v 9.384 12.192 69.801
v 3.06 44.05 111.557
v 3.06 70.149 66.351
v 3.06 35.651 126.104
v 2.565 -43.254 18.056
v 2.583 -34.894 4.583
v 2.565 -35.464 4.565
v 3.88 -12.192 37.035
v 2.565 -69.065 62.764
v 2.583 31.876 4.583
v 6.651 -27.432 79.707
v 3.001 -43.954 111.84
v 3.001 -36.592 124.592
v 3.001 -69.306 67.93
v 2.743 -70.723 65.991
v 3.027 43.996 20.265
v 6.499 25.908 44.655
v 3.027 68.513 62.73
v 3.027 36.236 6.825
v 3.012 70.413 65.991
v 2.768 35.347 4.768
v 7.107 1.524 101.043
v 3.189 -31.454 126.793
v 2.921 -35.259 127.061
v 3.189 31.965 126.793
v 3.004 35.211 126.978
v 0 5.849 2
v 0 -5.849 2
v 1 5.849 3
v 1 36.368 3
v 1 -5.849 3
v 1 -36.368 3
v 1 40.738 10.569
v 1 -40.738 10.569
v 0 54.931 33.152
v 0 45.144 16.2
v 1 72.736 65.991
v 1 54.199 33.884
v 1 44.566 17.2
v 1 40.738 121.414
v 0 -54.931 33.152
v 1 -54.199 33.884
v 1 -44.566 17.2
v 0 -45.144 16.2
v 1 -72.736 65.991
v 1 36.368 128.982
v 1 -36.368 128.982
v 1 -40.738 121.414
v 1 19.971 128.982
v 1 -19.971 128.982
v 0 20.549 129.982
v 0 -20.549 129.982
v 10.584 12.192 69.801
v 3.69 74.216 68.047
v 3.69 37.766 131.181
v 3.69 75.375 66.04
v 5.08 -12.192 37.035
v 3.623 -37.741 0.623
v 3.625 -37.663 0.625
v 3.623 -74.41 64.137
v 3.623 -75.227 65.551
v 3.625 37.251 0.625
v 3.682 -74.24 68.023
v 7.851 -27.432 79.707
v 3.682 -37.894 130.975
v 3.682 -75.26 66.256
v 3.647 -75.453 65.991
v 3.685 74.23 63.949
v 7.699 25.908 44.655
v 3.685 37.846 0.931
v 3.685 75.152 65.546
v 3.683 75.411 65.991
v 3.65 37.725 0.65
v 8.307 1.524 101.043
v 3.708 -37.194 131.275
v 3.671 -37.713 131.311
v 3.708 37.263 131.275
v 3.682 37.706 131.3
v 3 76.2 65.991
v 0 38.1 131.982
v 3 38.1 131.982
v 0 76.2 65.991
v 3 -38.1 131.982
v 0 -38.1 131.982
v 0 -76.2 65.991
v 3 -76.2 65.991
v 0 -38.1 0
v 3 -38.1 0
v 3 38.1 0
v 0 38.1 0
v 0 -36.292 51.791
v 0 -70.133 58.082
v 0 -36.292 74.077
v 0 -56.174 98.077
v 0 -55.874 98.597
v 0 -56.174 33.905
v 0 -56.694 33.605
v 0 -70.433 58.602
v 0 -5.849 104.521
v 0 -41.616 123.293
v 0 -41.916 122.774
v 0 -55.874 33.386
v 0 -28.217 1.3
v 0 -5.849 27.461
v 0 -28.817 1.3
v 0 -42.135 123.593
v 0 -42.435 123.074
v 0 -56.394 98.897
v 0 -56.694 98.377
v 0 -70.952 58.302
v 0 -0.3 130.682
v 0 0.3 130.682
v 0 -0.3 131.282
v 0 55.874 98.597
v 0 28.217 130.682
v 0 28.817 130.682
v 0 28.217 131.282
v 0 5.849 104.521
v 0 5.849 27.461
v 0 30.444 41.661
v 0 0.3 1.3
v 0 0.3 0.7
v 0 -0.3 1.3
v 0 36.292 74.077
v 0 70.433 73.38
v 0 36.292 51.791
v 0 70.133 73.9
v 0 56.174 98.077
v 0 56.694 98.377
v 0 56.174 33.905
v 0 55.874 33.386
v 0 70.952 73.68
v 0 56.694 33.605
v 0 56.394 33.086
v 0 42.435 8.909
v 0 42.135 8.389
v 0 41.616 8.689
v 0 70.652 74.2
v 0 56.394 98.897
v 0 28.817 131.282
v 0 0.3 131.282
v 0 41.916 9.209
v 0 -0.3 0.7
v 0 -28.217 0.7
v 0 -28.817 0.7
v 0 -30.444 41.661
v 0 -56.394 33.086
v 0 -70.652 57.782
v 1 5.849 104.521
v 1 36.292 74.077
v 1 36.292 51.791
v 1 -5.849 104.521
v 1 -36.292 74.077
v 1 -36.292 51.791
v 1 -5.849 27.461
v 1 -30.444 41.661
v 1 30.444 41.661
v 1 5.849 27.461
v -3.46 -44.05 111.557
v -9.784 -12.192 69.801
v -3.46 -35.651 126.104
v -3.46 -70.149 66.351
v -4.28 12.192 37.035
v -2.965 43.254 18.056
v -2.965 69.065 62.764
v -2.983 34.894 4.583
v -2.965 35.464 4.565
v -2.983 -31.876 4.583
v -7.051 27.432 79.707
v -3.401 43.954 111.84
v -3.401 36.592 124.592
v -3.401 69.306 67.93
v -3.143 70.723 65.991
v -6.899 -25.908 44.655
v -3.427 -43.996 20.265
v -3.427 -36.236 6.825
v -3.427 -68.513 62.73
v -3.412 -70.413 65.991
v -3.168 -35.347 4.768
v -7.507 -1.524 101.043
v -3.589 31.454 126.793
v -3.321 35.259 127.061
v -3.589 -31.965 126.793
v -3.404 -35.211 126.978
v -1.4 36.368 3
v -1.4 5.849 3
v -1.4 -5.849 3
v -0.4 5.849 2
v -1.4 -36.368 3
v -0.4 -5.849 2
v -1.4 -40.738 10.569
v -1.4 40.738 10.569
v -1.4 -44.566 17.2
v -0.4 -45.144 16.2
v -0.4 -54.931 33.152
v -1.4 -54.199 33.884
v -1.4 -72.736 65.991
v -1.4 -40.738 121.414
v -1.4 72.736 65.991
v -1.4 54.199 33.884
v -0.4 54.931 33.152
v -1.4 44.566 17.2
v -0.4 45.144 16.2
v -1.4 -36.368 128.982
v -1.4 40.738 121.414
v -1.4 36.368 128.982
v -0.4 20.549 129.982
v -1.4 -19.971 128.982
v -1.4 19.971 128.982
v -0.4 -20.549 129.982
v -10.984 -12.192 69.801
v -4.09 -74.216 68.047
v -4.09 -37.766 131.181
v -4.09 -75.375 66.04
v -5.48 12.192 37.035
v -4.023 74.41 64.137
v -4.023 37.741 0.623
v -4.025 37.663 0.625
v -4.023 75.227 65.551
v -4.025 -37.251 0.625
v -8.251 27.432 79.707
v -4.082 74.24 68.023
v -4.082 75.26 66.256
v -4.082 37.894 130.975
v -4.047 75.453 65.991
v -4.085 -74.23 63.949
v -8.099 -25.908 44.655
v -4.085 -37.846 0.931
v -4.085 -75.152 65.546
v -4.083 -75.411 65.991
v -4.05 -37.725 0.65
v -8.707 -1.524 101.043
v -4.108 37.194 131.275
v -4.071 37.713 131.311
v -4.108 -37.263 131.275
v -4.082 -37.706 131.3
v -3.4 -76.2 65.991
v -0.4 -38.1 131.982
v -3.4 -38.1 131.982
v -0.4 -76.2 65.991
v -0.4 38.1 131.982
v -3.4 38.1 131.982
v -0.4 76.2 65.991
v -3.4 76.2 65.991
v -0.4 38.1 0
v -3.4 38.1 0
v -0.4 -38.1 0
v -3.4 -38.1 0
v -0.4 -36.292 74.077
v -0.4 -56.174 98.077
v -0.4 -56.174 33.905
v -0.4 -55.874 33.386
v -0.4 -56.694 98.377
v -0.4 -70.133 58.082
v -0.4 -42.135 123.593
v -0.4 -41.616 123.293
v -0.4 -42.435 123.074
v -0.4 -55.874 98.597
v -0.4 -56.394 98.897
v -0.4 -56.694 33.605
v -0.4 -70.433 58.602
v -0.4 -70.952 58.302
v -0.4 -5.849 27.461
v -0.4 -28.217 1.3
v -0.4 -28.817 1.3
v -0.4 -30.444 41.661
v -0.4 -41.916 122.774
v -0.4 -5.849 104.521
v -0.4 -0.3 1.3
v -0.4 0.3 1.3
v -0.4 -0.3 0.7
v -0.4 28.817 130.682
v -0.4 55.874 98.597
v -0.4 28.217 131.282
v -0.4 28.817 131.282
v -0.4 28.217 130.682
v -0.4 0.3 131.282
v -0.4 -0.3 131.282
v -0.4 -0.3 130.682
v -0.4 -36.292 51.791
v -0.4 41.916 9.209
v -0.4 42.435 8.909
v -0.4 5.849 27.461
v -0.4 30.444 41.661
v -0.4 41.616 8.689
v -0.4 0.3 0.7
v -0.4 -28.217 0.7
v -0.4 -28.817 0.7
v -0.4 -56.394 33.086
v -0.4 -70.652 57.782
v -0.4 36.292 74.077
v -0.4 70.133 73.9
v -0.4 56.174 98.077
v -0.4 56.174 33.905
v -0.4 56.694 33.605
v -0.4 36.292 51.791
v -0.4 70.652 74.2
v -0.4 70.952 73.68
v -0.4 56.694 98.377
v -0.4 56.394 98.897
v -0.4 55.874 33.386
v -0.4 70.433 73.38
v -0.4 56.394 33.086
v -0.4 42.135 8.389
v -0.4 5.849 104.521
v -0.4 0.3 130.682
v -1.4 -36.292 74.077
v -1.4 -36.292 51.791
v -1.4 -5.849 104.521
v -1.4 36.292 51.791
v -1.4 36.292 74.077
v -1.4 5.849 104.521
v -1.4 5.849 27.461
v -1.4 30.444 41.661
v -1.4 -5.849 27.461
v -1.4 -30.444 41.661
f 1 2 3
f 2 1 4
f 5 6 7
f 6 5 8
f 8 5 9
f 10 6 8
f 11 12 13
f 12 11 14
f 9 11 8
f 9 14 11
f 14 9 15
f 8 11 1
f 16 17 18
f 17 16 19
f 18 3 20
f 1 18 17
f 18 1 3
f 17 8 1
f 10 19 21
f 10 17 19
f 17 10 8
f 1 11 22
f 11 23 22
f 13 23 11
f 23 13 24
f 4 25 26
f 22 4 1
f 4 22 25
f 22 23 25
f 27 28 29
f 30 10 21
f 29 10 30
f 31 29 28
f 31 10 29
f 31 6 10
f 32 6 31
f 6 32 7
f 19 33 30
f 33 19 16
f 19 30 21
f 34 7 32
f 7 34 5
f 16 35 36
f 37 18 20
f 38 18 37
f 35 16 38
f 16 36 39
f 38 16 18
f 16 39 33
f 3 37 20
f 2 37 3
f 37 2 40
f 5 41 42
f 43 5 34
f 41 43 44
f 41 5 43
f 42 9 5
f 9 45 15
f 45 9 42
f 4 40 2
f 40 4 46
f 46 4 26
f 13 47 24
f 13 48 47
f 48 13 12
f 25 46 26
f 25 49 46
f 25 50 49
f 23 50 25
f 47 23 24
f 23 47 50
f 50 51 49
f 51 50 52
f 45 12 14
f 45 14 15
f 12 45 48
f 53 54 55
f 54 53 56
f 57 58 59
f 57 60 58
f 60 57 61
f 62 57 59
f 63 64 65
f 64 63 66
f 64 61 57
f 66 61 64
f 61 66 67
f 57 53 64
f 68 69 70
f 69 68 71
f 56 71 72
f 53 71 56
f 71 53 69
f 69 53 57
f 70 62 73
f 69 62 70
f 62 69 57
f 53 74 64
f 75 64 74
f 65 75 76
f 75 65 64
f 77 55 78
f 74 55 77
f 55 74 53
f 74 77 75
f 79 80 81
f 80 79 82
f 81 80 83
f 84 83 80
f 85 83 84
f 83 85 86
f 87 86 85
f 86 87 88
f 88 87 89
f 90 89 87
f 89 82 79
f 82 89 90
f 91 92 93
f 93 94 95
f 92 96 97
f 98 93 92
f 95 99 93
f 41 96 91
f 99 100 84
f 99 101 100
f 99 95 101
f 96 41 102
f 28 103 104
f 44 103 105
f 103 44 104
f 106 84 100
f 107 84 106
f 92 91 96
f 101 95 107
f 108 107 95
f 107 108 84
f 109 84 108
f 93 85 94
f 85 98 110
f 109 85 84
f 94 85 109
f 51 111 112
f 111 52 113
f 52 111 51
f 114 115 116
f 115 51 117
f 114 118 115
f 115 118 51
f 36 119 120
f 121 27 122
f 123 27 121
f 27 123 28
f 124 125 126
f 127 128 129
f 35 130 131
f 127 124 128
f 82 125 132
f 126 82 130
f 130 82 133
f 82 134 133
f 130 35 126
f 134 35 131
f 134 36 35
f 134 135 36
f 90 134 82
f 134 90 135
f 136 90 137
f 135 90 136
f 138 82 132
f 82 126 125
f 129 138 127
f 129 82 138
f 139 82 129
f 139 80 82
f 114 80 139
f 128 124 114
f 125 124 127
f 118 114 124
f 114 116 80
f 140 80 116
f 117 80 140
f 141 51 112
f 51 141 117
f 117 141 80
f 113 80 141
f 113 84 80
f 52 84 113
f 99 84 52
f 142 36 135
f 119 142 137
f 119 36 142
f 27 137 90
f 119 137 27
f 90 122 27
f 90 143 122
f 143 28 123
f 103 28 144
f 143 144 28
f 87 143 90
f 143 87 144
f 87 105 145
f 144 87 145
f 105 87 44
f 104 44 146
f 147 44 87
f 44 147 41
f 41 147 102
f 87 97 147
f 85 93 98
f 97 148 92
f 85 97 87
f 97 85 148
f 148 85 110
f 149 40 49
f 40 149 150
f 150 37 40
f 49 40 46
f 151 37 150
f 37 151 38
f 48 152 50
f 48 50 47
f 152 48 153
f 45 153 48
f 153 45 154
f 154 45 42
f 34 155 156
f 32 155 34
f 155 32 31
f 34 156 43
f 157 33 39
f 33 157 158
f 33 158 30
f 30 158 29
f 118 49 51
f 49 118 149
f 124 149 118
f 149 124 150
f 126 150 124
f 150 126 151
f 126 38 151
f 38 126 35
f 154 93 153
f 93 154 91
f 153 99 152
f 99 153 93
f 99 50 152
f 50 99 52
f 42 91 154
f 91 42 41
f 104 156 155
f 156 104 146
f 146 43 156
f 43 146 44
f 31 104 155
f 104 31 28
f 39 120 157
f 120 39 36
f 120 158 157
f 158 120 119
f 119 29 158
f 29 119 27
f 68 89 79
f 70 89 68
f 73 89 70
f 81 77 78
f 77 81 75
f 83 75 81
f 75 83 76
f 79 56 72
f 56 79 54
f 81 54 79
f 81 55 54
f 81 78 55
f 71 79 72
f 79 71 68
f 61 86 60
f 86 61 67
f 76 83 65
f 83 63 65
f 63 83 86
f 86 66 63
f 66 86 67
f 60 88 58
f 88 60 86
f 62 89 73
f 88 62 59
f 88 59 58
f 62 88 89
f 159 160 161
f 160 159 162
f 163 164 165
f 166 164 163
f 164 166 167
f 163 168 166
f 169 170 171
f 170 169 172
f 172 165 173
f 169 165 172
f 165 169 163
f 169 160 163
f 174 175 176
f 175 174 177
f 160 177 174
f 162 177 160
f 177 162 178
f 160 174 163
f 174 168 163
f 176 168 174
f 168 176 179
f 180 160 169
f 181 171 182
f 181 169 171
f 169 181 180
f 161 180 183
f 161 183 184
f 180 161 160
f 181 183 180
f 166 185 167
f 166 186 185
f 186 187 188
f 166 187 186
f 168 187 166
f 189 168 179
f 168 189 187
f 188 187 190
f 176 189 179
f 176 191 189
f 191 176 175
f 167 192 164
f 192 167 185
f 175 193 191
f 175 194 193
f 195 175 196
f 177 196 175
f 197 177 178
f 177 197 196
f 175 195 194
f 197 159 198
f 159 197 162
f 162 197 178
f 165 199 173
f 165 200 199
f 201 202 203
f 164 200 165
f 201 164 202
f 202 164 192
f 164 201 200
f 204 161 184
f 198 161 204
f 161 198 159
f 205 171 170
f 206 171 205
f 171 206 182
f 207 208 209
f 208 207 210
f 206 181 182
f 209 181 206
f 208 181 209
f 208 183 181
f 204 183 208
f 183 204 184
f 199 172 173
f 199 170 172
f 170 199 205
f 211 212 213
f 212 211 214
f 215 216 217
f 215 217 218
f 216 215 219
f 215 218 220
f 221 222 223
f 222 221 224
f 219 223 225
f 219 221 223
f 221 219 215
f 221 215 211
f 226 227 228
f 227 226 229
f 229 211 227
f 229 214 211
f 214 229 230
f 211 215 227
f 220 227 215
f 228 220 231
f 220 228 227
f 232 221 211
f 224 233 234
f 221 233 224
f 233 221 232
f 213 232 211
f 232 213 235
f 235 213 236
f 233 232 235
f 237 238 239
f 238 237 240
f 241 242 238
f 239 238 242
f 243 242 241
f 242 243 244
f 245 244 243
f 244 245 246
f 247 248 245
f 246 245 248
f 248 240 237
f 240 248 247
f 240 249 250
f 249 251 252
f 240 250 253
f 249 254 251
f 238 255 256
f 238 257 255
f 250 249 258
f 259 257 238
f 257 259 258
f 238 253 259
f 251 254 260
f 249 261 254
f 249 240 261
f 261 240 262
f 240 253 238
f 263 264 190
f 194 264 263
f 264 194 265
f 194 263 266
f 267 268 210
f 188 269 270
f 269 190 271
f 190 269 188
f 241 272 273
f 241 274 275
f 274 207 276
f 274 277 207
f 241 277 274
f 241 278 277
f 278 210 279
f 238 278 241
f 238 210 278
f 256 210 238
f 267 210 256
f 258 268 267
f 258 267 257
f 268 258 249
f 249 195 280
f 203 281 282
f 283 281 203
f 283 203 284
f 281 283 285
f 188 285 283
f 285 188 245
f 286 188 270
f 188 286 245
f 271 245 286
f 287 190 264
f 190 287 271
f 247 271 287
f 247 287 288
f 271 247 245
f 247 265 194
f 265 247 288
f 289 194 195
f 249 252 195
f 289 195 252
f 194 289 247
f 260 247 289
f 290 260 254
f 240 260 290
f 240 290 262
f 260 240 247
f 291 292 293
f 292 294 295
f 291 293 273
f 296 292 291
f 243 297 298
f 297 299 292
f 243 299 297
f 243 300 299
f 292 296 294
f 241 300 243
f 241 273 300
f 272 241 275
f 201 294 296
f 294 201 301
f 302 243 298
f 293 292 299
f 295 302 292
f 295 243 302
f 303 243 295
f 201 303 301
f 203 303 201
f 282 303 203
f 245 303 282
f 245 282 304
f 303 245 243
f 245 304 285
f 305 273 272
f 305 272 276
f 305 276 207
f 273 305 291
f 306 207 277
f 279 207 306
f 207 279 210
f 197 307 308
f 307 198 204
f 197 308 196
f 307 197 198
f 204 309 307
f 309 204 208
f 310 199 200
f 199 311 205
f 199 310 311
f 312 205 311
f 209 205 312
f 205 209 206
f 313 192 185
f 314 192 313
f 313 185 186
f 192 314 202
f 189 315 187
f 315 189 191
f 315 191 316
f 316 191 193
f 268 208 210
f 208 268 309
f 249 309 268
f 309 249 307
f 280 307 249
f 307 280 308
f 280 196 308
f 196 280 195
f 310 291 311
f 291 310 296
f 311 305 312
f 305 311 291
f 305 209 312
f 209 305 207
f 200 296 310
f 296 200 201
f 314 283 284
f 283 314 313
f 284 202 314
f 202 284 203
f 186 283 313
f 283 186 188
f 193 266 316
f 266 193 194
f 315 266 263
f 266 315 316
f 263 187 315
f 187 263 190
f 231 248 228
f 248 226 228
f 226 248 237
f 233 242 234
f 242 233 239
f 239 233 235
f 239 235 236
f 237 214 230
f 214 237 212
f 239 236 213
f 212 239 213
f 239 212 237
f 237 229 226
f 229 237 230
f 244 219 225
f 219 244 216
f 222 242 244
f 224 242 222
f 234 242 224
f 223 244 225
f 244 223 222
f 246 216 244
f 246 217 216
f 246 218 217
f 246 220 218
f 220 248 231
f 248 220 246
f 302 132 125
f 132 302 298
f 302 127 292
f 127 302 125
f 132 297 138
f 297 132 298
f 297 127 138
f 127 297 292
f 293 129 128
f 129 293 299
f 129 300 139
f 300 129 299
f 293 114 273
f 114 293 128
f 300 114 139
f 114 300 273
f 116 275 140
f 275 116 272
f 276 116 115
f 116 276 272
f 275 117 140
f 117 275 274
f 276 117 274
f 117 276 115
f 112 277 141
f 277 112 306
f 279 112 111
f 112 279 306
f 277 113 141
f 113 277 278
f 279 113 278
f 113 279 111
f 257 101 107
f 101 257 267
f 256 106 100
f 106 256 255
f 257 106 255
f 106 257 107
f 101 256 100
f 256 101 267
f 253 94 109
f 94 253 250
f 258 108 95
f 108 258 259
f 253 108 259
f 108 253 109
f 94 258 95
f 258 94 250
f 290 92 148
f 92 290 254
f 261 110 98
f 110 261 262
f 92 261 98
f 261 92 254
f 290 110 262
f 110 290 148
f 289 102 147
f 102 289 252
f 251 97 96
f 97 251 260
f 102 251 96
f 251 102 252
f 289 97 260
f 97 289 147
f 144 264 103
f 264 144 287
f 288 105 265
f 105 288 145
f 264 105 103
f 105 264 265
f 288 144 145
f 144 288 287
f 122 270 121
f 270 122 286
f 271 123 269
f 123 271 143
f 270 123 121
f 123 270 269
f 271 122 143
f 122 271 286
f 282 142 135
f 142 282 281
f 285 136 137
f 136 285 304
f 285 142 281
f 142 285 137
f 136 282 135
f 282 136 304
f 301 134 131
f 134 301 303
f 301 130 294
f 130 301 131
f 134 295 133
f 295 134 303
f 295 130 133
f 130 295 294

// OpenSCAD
// Hexagon wall tile v39 — parametric rebuild of v30
// Front: identical low-poly facets to v30 (same facet angles at every size).
// Edge profile: identical on every size (edge depth, rim width) so tiles butt flush.
// Back: six corner pads for 1" (25 mm) double-sided mounting tape.
// v32: tape pads are flat plates hung from the rim with an air gap to the front skin.
// v33: thinner skin + thinner pads so the air gap is 1.4 mm even right at the edges
//      (v32 had only 0.8 mm there and showed marks along the slanted edges).
// v34: snap-off stabilizer fins behind the bottom edge so the tall, thin tile can't tip over
//      while printing. Break them off afterwards (bend sideways) and the back stays flat.
// v35: 0.6 mm 45° chamfer on the front edge (crisp, consistent shadow line between tiles; hides
//      first-layer squish and brim trim marks) + relief_scale to deepen the facets if wanted.
// v37: much smaller breakaway tabs (0.8 x 0.6 mm, every 8 mm) so the fins snap off easily.
// v38: full-height snap-off BRACE FRAME behind the tile: a thin hex ring + X/vertical bars,
//      1 mm behind the back, tied to the tile rim by tiny tabs all the way round (incl. the top).
//      Tile + brace act as a stiff box while printing; the fins now sit on the brace.
//      Peel the brace off after printing — the tabs only touch the back rim.
// v39: PAIR mode (default): two identical tiles printed back-to-back, 0.4 mm apart, so each
//      cradles the other full-height. Only 12 tiny tabs (corners + mid-sides) join the back
//      rims — twist/peel the tiles apart. No brace, no fins, almost no waste. The pair is
//      turned 90° on the bed so the 'back' seam lands on a side edge, not on either face.
// Prints upright on a flat edge with NO supports (every downward edge is 45° or steeper).
//
// Export one size at a time, e.g.:
//   openscad -D size_in=6 -o hex_pair_v39_6in.stl hex_wall_tile_v39.scad

/* [Size] */
size_in       = 6;      // point-to-point width in inches (3, 6, 10 ...)

/* [Edge profile — keep identical across sizes] */
// Space behind the skin at the edge = edge_depth - skin; it must be >= pad_plate + pad_gap + pad_recess.
edge_depth    = 3.6;    // depth of the outer edge, back plane to front face (mm)
rim           = 2.0;    // perimeter wall thickness at the back plane (mm)
front_chamfer = 0.6;    // 45° chamfer on the front edge (mm); 0 = sharp edge

/* [Look] */
relief_scale  = 1.0;    // 1.0 = v30 facets; 1.5 = 50% deeper facets (same edge profile on all sizes)

/* [Front skin] */
skin          = 1.2;    // front skin thickness (mm) — 3 lines at 0.4 mm, same on all sizes

/* [Tape pads] */
tape_width    = 25.4;   // tape width (mm)
pad_margin    = 3;      // extra pad width beyond the tape (mm)
pad_max_frac  = 0.45;   // pad never larger than this fraction of the tile radius (keeps 3" usable)
pad_plate     = 1.0;    // thickness of the pad plates (mm)
pad_gap       = 1.4;    // minimum air gap between pads and the front skin (mm) — keeps the front clean
pad_recess    = 0;      // pads set back from the rim (mm); >0 lets the rim touch the wall,
                        // but near the edges the plate is then trimmed thinner to keep pad_gap

/* [Print stabilizers (snap off after printing)] */
stabilizers   = false;  // v34-v38 option; not needed in pair mode
fin_count     = 2;      // fins behind the bottom edge, placed symmetrically
fin_thick     = 1.6;    // fin thickness (mm)
fin_height_frac = 0.35; // fin height as a fraction of the tile height
fin_depth_frac  = 0.4;  // fin depth behind the brace as a fraction of fin height
fin_depth_min   = 15;   // (mm)
fin_gap       = 0.5;    // air gap between fin and tile back (mm)
tab_height    = 0.6;    // breakaway tab height (mm, vertical when printing) — 3 layers at 0.2
tab_width     = 0.8;    // breakaway tab width (mm), centred on the fin — 2 lines
tab_pitch     = 8;      // spacing between tabs (mm)

/* [Full-height brace frame (snap off after printing)] */
brace         = false;  // v38 option; not needed in pair mode
brace_gap     = 1.0;    // air gap between tile back and brace (mm)
brace_thick   = 1.6;    // brace thickness (mm)
brace_rim_w   = 4;      // width of the brace's hex ring (mm)
brace_bar_w   = 3;      // width of the X and vertical bars (mm)
brace_tab_pitch = 10;   // spacing of brace tabs along each rim side (mm)
brace_tab     = 0.8;    // brace tab size (mm) — tiny, so the brace peels off

/* [Back-to-back pair (default)] */
pair          = true;
pair_gap      = 0.4;    // gap between the two back planes (mm): close enough to cradle, not fused
pair_tab      = 0.6;    // tab size (mm) — 12 tabs total, tiny so the pair twists apart

/* [Output] */
orient_for_print = true; // stand upright on a flat edge, back facing +Y

/* [Hidden] */
R   = size_in * 25.4 / 2;         // corner radius
AP  = R * cos(30);                // apothem
PAD = min(tape_width + pad_margin, R * pad_max_frac);

// Normalised front geometry from v30 (x, y in units of R; z = relief above edge, units of R)
FP = [[1,0,0],[0.5,0.866025,0],[-0.5,0.866025,0],[-1,0,0],[-0.5,-0.866025,0],[0.5,-0.866025,0],
      [0.16,0.05,0.091654],[-0.16,-0.38,0.019428],[-0.36,0.18,0.05579],[0.34,-0.28,0.053795],[0.02,0.46,0.061766]];
FACES = [[0,6,1],[4,3,7],[5,4,7],[8,3,2],[7,3,8],[7,8,6],[5,9,0],[9,6,0],[9,7,6],[5,7,9],
         [6,8,10],[8,2,10],[6,10,1],[10,2,1],
         [1,12,11,0],[2,13,12,1],[3,14,13,2],[4,15,14,3],[5,16,15,4],[0,11,16,5],
         [11,12,13,14,15,16]];
RELIEF_MAX = 0.091654 * R * relief_scale;
D = edge_depth + RELIEF_MAX + 1;  // max depth used for chamfers

// Solid bounded by the faceted front (shifted by dz) and a flat back at z = zb
module body(dz = 0, zb = 0) {
    pts = concat(
        [for (p = FP) [p[0]*R, p[1]*R, edge_depth + p[2]*R*relief_scale + dz]],
        [for (i = [0:5]) [FP[i][0]*R, FP[i][1]*R, zb]]);
    polyhedron(points = pts, faces = FACES, convexity = 4);
}

module hex2d(apothem) { circle(r = apothem / cos(30), $fn = 6); }

// Back cavity: behind the skin, inside the rim; rim inner faces slope 45° so nothing needs support
module cavity(extra = 0) {
    H  = D + 2;
    a0 = AP - rim - extra + 1;             // apothem at z = -1
    intersection() {
        body(dz = -skin - extra, zb = -1);
        translate([0, 0, -1]) linear_extrude(height = H, scale = (a0 - H) / a0) hex2d(a0);
    }
}

// Corner pad footprint (2D), k = corner index 0..5:
// the corner region of the inner hex, PAD wide, long enough to hold a PAD x PAD square of tape
module pad_core(k) {
    U0  = (AP - rim) / cos(30);                    // inner corner distance from centre
    LEN = PAD / (2 * tan(60)) + PAD + 1;           // apex taper + full square + margin
    intersection() {
        hex2d(AP - rim + 0.3);                     // overlap 0.3 mm into the rim to fuse
        rotate(60 * k) translate([U0 - LEN, -PAD / 2]) square([LEN + 5, PAD]);
    }
}

// In-plane self-support: printed upright, a vertical plate needs every downward edge at >= 45°.
// Sweep each pad toward the nearest rim side below it at 45° (or straight down for bottom corners).
SWEEP = [[1, -1], [1, -1], [-1, -1], [-1, -1], [0, -1], [0, -1]];
module pad_fp(k) {
    intersection() {
        hex2d(AP - rim + 0.3);
        hull() { pad_core(k); translate(SWEEP[k] * R) pad_core(k); }
    }
}

module pads() {
    intersection() {
        body(dz = -skin - pad_gap, zb = -1);       // never closer than pad_gap to the skin
        translate([0, 0, pad_recess]) linear_extrude(pad_plate) for (k = [0:5]) pad_fp(k);
    }
}

module chamfer_clip() {
    HB = D + 5;
    union() {
        translate([0, 0, -2]) linear_extrude(edge_depth - front_chamfer + 2) hex2d(AP + 1);
        translate([0, 0, edge_depth - front_chamfer]) linear_extrude(height = HB, scale = (AP - HB) / AP) hex2d(AP);
    }
}

module tile() {
    intersection() {
        union() {
            difference() { body(); cavity(); }
            pads();
        }
        if (front_chamfer > 0) chamfer_clip(); else translate([-2*R, -2*R, -5]) cube([4*R, 4*R, 4*R]);
    }
}

// Triangular fins standing on the bed behind the back (model z < 0), joined to the tile by small tabs
FIN_H = fin_height_frac * 2 * AP;
FIN_L = max(fin_depth_min, fin_depth_frac * FIN_H);
function fin_x(i) = (fin_count == 1) ? 0 : (-1 + 2 * i / (fin_count - 1)) * 0.35 * R;
BZ = brace ? brace_gap + brace_thick : 0;          // fins start behind the brace when it is used
module stabilizer_fins() {
    for (i = [0 : fin_count - 1]) {
        x = fin_x(i);
        fg = brace ? BZ - 0.3 : fin_gap;                // with a brace: fused into it (no tabs needed)
        hull() {                                            // fin: vertical triangle
            translate([x - fin_thick/2, -AP, -fg - FIN_L]) cube([fin_thick, 0.01, FIN_L]);
            translate([x - fin_thick/2, -AP, -fg - 0.01]) cube([fin_thick, FIN_H, 0.01]);
        }
        if (!brace)
            for (y = [0 : tab_pitch : FIN_H - tab_height])  // breakaway tabs into the back plane
                translate([x - tab_width/2, -AP + y, -fin_gap - 0.05]) cube([tab_width, tab_height, fin_gap + 0.35]);
    }
}

// Brace frame (2D, in the tile plane). Printed upright, so every downward-facing edge is >= 45°:
// the top bar is carried by 45° roofs in the two top windows; bars run vertical or at ±60°.
module brace_2d() {
    W  = brace_rim_w;
    Yt = AP - W;                                        // underside of the top ring bar
    difference() {
        hex2d(AP);
        intersection() {                                // the open window, with a 45° roof under the top bar
            hex2d(AP - W);
            // only the two top windows touch the top bar: give them a 45° valley roof
            polygon([[-2*R, -2*R], [2*R, -2*R], [2*R, 2*R], [R/2, 2*R], [R/2, Yt],
                     [0, Yt - R/2], [-R/2, Yt], [-R/2, 2*R], [-2*R, 2*R]]);
        }
    }
    intersection() {
        hex2d(AP);
        union() {
            square([brace_bar_w, 2*AP], center = true);                 // vertical bar
            rotate(60)  square([4*R, brace_bar_w], center = true);      // ±60° diagonals (corner to corner)
            rotate(-60) square([4*R, brace_bar_w], center = true);
        }
    }
}

module brace_frame() {
    translate([0, 0, -BZ]) linear_extrude(brace_thick) brace_2d();
    // tiny tabs across the gap, on the tile's back rim (1 mm in from the outline), all six sides
    for (k = [0:5]) {
        a0 = 60*k; a1 = 60*(k+1);
        p0 = [ (R - 1/sin(60)) * cos(a0), (R - 1/sin(60)) * sin(a0) ];
        p1 = [ (R - 1/sin(60)) * cos(a1), (R - 1/sin(60)) * sin(a1) ];
        L  = norm(p1 - p0);
        n  = floor((L - 6) / brace_tab_pitch);
        for (j = [0 : n]) {
            t = (3 + j * (L - 6) / max(n, 1)) / L;
            p = p0 + t * (p1 - p0);
            translate([p[0], p[1], -brace_gap - 0.3]) rotate(a0 + 120)
                translate([-brace_tab/2, -brace_tab/2, 0]) cube([brace_tab, brace_tab, brace_gap + 0.6]);
        }
    }
}

// 12 tabs across the pair gap: at each rim corner and each rim mid-side (1 mm in from the outline)
module pair_tabs() {
    rr = R - 1/sin(60);
    for (k = [0:5]) for (f = [0.12, 0.5, 0.88]) if (f == 0.5 || f == 0.12) {
        a0 = 60*k; a1 = 60*(k+1);
        p = [rr*cos(a0), rr*sin(a0)] + f * ([rr*cos(a1), rr*sin(a1)] - [rr*cos(a0), rr*sin(a0)]);
        translate([p[0], p[1], -pair_gap - 0.3]) rotate(a0 + 120)
            translate([-pair_tab/2, -pair_tab/2, 0]) cube([pair_tab, pair_tab, pair_gap + 0.6]);
    }
}
module partner() { translate([0, 0, -pair_gap]) rotate([0, 180, 0]) tile(); }   // same tile turned round, not mirrored

module assembly() {
    tile();
    if (pair) { partner(); pair_tabs(); }
    else { if (brace) brace_frame(); if (stabilizers) stabilizer_fins(); }
}

if (orient_for_print)
    rotate([0, 0, pair ? 90 : 0]) translate([0, 0, AP]) rotate([90, 0, 0]) assembly();
else
    assembly();
